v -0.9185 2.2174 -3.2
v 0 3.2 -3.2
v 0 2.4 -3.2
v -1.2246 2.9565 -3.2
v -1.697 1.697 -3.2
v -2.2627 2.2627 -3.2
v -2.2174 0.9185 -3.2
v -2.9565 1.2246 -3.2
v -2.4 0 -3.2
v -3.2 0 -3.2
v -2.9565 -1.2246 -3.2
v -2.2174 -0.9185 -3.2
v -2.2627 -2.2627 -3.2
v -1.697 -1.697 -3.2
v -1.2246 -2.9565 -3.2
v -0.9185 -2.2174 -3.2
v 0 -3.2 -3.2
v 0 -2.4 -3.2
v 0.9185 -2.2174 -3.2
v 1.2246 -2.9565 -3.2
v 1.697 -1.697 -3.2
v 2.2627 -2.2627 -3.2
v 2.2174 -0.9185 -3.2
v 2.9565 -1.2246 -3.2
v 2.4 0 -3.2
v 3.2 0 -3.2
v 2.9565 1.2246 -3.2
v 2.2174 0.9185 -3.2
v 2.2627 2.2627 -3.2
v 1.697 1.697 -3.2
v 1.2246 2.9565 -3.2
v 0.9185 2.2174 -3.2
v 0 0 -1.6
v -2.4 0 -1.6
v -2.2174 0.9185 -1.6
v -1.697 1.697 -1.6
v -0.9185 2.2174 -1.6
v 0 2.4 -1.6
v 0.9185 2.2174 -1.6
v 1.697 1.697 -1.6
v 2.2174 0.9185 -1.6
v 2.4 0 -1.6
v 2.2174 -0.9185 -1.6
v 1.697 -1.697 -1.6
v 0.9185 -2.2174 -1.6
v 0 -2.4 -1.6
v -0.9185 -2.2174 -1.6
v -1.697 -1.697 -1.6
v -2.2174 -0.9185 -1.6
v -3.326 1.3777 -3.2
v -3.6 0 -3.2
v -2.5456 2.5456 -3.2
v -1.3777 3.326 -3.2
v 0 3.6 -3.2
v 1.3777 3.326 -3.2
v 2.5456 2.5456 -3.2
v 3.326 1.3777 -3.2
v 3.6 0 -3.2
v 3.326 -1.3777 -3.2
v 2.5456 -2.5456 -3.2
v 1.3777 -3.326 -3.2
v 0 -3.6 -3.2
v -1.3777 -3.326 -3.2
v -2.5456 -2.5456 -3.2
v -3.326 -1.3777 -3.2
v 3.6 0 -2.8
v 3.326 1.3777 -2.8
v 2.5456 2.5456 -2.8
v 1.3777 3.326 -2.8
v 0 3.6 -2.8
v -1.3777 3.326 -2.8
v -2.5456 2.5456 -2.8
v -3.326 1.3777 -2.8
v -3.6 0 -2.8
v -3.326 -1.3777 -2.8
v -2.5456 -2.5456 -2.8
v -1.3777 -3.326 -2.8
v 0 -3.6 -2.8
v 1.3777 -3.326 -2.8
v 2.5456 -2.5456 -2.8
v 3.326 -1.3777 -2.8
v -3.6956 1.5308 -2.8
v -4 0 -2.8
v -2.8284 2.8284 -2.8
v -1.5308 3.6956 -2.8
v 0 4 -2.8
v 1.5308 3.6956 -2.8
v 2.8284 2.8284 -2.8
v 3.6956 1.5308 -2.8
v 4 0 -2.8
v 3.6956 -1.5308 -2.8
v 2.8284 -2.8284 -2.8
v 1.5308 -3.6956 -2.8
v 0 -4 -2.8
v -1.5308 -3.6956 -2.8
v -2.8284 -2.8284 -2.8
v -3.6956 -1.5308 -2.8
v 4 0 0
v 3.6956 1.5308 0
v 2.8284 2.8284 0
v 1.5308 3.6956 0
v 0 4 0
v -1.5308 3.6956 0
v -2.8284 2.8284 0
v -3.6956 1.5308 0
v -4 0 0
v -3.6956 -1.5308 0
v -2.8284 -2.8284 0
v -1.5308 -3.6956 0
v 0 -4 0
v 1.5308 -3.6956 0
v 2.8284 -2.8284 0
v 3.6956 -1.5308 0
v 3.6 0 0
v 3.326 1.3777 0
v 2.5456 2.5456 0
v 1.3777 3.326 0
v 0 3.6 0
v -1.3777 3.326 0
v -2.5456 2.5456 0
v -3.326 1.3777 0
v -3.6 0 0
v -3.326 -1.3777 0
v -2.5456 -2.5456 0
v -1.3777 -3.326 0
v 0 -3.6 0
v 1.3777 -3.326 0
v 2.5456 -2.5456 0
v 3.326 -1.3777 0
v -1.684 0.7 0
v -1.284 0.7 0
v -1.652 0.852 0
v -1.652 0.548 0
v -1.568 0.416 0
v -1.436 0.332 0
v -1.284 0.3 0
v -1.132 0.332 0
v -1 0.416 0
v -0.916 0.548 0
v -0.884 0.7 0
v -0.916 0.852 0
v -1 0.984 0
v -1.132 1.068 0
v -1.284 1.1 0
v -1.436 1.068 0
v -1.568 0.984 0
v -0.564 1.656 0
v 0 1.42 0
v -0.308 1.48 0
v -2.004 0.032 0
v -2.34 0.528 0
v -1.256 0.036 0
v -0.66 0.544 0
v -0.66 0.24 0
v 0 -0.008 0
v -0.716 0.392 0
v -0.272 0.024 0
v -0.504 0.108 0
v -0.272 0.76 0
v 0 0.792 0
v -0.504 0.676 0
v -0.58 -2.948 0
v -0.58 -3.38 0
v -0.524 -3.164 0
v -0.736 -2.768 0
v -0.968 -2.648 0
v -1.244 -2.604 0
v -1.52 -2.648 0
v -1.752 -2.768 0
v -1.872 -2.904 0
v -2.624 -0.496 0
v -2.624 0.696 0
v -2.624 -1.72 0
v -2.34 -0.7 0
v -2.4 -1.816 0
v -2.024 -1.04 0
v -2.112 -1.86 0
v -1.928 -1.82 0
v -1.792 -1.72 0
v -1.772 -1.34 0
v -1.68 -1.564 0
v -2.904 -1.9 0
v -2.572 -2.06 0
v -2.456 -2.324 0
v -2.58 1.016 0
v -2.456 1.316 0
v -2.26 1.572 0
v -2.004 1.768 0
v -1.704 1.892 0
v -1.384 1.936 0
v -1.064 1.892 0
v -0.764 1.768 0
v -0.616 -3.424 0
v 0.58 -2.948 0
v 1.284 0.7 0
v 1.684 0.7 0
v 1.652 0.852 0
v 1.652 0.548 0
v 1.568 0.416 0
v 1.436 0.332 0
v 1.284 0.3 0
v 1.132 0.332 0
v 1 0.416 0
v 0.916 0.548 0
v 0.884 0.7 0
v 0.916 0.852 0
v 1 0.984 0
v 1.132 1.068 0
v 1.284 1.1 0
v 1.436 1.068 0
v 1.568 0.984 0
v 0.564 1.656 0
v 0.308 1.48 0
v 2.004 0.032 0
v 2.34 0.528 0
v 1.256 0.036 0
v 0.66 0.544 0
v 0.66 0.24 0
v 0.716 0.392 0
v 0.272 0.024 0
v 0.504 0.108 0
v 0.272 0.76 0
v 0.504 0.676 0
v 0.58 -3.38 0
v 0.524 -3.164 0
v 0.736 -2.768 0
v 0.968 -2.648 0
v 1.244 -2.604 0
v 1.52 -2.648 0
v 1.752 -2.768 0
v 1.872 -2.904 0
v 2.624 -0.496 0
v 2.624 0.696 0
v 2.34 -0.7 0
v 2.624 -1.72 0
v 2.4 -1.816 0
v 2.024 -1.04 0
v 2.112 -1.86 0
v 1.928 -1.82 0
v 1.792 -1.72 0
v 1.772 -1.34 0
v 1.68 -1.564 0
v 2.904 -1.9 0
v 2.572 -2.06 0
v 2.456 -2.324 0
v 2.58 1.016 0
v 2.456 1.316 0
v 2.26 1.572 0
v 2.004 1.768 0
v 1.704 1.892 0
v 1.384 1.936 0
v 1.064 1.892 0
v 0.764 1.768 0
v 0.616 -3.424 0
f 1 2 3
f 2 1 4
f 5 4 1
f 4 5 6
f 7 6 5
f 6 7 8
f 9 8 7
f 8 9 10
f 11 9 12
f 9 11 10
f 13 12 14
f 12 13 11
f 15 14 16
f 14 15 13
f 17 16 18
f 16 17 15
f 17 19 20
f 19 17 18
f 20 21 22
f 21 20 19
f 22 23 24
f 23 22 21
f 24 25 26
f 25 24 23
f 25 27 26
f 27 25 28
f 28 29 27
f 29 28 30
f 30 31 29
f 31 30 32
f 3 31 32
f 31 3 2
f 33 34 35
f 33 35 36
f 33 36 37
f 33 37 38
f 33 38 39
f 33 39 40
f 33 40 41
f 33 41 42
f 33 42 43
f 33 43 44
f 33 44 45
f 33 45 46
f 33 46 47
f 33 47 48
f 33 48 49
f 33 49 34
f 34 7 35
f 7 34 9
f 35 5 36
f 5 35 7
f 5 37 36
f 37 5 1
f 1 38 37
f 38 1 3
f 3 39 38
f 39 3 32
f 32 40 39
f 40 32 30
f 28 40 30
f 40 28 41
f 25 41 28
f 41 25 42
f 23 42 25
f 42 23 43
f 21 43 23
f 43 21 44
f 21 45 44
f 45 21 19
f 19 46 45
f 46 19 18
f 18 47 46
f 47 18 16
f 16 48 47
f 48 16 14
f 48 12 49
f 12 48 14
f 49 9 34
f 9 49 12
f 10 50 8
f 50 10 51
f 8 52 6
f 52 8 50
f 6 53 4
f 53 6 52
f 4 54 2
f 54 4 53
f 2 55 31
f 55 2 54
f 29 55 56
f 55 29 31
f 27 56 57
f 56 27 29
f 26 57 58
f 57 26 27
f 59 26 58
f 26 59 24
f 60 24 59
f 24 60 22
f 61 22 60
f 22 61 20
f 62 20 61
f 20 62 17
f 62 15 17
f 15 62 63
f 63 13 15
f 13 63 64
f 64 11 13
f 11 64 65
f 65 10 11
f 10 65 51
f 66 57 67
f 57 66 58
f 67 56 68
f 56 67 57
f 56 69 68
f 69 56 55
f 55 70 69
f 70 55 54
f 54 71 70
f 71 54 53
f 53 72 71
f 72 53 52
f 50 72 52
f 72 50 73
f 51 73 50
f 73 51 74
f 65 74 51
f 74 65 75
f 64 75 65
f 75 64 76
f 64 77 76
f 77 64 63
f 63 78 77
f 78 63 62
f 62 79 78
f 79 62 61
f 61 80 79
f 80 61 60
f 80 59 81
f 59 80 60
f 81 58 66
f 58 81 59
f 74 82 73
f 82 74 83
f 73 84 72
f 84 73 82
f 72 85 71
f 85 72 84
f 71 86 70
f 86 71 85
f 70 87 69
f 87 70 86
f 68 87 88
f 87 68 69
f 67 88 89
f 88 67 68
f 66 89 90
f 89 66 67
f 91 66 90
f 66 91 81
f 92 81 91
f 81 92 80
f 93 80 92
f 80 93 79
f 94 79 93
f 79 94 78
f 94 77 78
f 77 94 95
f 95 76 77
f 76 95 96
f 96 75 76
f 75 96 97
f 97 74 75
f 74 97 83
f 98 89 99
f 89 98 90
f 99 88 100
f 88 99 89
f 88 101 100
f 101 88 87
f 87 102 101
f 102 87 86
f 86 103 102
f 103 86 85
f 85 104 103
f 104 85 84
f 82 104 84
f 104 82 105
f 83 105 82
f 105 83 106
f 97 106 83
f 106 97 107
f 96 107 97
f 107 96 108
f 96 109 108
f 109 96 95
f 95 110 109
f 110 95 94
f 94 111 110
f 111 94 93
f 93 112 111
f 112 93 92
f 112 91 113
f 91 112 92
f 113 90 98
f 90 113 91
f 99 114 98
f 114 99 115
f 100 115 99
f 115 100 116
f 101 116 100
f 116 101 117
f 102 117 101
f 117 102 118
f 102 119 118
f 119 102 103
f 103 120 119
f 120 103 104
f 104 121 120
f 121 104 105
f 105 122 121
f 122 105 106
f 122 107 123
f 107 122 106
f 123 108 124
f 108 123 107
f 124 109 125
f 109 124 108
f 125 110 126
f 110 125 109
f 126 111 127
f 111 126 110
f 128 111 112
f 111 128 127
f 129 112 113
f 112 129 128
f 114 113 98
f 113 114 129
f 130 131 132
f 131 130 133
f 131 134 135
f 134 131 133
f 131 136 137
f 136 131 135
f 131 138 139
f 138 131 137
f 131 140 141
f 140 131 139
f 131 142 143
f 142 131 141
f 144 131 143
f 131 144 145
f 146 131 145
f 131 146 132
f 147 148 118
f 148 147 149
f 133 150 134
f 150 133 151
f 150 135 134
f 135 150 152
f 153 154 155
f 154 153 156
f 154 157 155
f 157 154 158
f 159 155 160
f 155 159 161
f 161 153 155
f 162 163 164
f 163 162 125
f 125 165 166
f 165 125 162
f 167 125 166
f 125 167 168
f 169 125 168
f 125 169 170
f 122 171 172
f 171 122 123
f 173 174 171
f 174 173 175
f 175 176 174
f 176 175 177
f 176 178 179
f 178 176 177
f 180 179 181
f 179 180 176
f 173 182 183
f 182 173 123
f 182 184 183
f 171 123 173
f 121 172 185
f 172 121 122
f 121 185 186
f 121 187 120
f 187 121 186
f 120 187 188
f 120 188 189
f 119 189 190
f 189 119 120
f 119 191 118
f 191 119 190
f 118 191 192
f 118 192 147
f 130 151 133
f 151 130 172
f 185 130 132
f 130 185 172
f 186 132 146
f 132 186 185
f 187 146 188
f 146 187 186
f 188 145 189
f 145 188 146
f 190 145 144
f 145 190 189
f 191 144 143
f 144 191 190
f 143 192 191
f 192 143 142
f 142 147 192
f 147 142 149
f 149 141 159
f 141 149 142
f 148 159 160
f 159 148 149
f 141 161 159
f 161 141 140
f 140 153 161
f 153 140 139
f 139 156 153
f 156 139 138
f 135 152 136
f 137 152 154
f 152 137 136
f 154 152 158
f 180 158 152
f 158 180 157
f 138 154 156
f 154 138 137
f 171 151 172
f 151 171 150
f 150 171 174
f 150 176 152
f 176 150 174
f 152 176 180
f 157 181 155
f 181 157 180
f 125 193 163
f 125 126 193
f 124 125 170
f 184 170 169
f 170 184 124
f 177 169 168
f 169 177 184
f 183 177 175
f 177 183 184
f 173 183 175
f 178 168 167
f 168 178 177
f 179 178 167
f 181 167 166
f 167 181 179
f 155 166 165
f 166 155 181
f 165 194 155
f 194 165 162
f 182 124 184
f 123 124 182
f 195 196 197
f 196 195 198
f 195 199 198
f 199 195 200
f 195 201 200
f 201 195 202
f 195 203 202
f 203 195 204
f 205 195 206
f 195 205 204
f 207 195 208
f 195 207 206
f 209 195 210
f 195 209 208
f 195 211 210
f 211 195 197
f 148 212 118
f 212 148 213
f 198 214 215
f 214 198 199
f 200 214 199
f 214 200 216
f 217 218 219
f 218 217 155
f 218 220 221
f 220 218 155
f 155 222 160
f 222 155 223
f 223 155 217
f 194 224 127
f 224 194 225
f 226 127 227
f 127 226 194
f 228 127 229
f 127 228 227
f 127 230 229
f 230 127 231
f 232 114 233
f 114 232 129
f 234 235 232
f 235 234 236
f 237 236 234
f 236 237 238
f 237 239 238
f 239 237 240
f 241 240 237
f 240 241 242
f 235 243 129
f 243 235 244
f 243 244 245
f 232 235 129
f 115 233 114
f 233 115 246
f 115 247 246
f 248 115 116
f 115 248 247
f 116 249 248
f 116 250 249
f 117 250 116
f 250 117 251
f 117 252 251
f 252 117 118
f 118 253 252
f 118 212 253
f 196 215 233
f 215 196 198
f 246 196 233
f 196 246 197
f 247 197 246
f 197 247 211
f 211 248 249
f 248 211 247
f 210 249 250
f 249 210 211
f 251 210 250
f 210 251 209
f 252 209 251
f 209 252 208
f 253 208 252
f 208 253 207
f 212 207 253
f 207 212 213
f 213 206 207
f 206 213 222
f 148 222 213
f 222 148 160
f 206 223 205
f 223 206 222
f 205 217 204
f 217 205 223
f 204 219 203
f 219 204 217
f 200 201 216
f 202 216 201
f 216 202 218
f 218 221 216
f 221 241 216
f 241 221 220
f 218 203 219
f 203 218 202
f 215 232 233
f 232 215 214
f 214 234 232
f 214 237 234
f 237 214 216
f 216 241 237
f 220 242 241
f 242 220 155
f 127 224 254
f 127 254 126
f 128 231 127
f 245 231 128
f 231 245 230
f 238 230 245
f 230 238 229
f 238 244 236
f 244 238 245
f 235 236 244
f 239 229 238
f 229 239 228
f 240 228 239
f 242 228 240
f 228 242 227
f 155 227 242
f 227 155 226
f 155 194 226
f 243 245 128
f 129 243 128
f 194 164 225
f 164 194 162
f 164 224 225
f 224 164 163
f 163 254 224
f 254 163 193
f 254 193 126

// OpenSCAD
use <../lib.scad>
use <../p/1-16chrd.scad>
use <../p/2-4ering.scad>
use <../p/3-16ering.scad>
use <s/98138s01.scad>
$fa=1; $fs=0.2;
function ldraw_lib__98138p1l(realsolid=false) = [
// 0 Tile  1 x  1 Round with Black Penguin with Yellow Beak and Feet and Bright Pink Cheeks Pattern
// 0 Name: 98138p1l.dat
// 0 Author: Gerald Lasser [GeraldLasser]
// 0 !LDRAW_ORG Part UPDATE 2022-01
// 0 !LICENSE Licensed under CC BY 2.0 and CC BY 4.0 : see CAreadme.txt
// 
// 0 BFC CERTIFY CCW
  [0,"BFC","CERTIFY"],
  [0,"BFC","CCW"],
// 
// 0 !KEYWORDS Bricklink 98138pb162, Dots, Mega Pack, Set 41913
// 
// 0 !HISTORY 2022-01-14 [PTadmin] Official Update 2022-01
// 
// 
// 1 16 0 0 0 1 0 0 0 1 0 0 0 1 s\98138s01.dat
  [1,16,0,0,0,1,0,0,0,1,0,0,0,1, ldraw_lib__s__98138s01(realsolid)],
// 1 0 0 0 0 9 0 0 0 1 0 0 0 9 2-4ering.dat
  [1,0,0,0,0,9,0,0,0,1,0,0,0,9, ldraw_lib__2_4ering(realsolid)],
// 1 16 0 0 0 0 0 -9 0 1 0 -9 0 0 3-16ering.dat
  [1,16,0,0,0,0,0,-9,0,1,0,-9,0,0, ldraw_lib__3_16ering(realsolid)],
// 1 16 0 0 0 0 0 9 0 1 0 -9 0 0 3-16ering.dat
  [1,16,0,0,0,0,0,9,0,1,0,-9,0,0, ldraw_lib__3_16ering(realsolid)],
// 1 0 0 0 0 -9 0 0 0 1 0 0 0 -9 1-16chrd.dat
  [1,0,0,0,0,-9,0,0,0,1,0,0,0,-9, ldraw_lib__1_16chrd(realsolid)],
// 1 0 0 0 0 9 0 0 0 1 0 0 0 -9 1-16chrd.dat
  [1,0,0,0,0,9,0,0,0,1,0,0,0,-9, ldraw_lib__1_16chrd(realsolid)],
// 
// 4 0 -3.21 0 1.75 -4.13 0 2.13 -4.21 0 1.75 -4.13 0 1.37
  [4,0,-3.21,0,1.75,-4.13,0,2.13,-4.21,0,1.75,-4.13,0,1.37],
// 4 0 -3.21 0 1.75 -4.13 0 1.37 -3.92 0 1.04 -3.59 0 .83
  [4,0,-3.21,0,1.75,-4.13,0,1.37,-3.92,0,1.04,-3.59,0,.83],
// 4 0 -3.21 0 1.75 -3.59 0 .83 -3.21 0 .75 -2.83 0 .83
  [4,0,-3.21,0,1.75,-3.59,0,.83,-3.21,0,.75,-2.83,0,.83],
// 4 0 -3.21 0 1.75 -2.83 0 .83 -2.5 0 1.04 -2.29 0 1.37
  [4,0,-3.21,0,1.75,-2.83,0,.83,-2.5,0,1.04,-2.29,0,1.37],
// 4 0 -3.21 0 1.75 -2.29 0 1.37 -2.21 0 1.75 -2.29 0 2.13
  [4,0,-3.21,0,1.75,-2.29,0,1.37,-2.21,0,1.75,-2.29,0,2.13],
// 4 0 -3.21 0 1.75 -2.29 0 2.13 -2.5 0 2.46 -2.83 0 2.67
  [4,0,-3.21,0,1.75,-2.29,0,2.13,-2.5,0,2.46,-2.83,0,2.67],
// 4 0 -3.21 0 1.75 -2.83 0 2.67 -3.21 0 2.75 -3.59 0 2.67
  [4,0,-3.21,0,1.75,-2.83,0,2.67,-3.21,0,2.75,-3.59,0,2.67],
// 4 0 -3.21 0 1.75 -3.59 0 2.67 -3.92 0 2.46 -4.13 0 2.13
  [4,0,-3.21,0,1.75,-3.59,0,2.67,-3.92,0,2.46,-4.13,0,2.13],
// 4 0 0 0 9 -1.41 0 4.14 -.77 0 3.7 0 0 3.55
  [4,0,0,0,9,-1.41,0,4.14,-.77,0,3.7,0,0,3.55],
// 4 29 -4.13 0 1.37 -5.85 0 1.32 -5.01 0 .08 -3.92 0 1.04
  [4,29,-4.13,0,1.37,-5.85,0,1.32,-5.01,0,.08,-3.92,0,1.04],
// 4 29 -3.59 0 .83 -3.92 0 1.04 -5.01 0 .08 -3.14 0 .09
  [4,29,-3.59,0,.83,-3.92,0,1.04,-5.01,0,.08,-3.14,0,.09],
// 4 14 0 0 -.02 -1.65 0 1.36 -1.79 0 .98 -1.65 0 .6
  [4,14,0,0,-.02,-1.65,0,1.36,-1.79,0,.98,-1.65,0,.6],
// 4 14 0 0 -.02 -1.65 0 .6 -1.26 0 .27 -.68 0 .06
  [4,14,0,0,-.02,-1.65,0,.6,-1.26,0,.27,-.68,0,.06],
// 4 14 0 0 -.02 0 0 1.98 -.68 0 1.9 -1.26 0 1.69
  [4,14,0,0,-.02,0,0,1.98,-.68,0,1.9,-1.26,0,1.69],
// 3 14 -1.26 0 1.69 -1.65 0 1.36 0 0 -.02
  [3,14,-1.26,0,1.69,-1.65,0,1.36,0,0,-.02],
// 4 14 -3.4443 0 -8.3151 -1.45 0 -8.45 -1.31 0 -7.91 -1.45 0 -7.37
  [4,14,-3.4443,0,-8.3151,-1.45,0,-8.45,-1.31,0,-7.91,-1.45,0,-7.37],
// 4 14 -3.4443 0 -8.3151 -1.45 0 -7.37 -1.84 0 -6.92 -2.42 0 -6.62
  [4,14,-3.4443,0,-8.3151,-1.45,0,-7.37,-1.84,0,-6.92,-2.42,0,-6.62],
// 4 14 -3.4443 0 -8.3151 -2.42 0 -6.62 -3.11 0 -6.51 -3.8 0 -6.62
  [4,14,-3.4443,0,-8.3151,-2.42,0,-6.62,-3.11,0,-6.51,-3.8,0,-6.62],
// 4 14 -3.4443 0 -8.3151 -3.8 0 -6.62 -4.38 0 -6.92 -4.68 0 -7.26
  [4,14,-3.4443,0,-8.3151,-3.8,0,-6.62,-4.38,0,-6.92,-4.68,0,-7.26],
// 4 0 -6.56 0 -1.24 -6.56 0 1.74 -9 0 0 -8.3151 0 -3.4443
  [4,0,-6.56,0,-1.24,-6.56,0,1.74,-9,0,0,-8.3151,0,-3.4443],
// 4 0 -5.85 0 -1.75 -6.56 0 -1.24 -6.56 0 -4.3 -6 0 -4.54
  [4,0,-5.85,0,-1.75,-6.56,0,-1.24,-6.56,0,-4.3,-6,0,-4.54],
// 4 0 -5.85 0 -1.75 -6 0 -4.54 -5.28 0 -4.65 -5.06 0 -2.6
  [4,0,-5.85,0,-1.75,-6,0,-4.54,-5.28,0,-4.65,-5.06,0,-2.6],
// 4 0 -5.06 0 -2.6 -5.28 0 -4.65 -4.82 0 -4.55 -4.48 0 -4.3
  [4,0,-5.06,0,-2.6,-5.28,0,-4.65,-4.82,0,-4.55,-4.48,0,-4.3],
// 4 0 -4.43 0 -3.35 -5.06 0 -2.6 -4.48 0 -4.3 -4.2 0 -3.91
  [4,0,-4.43,0,-3.35,-5.06,0,-2.6,-4.48,0,-4.3,-4.2,0,-3.91],
// 4 0 -6.56 0 -4.3 -8.3151 0 -3.4443 -7.26 0 -4.75 -6.43 0 -5.15
  [4,0,-6.56,0,-4.3,-8.3151,0,-3.4443,-7.26,0,-4.75,-6.43,0,-5.15],
// 3 0 -7.26 0 -4.75 -6.14 0 -5.81 -6.43 0 -5.15
  [3,0,-7.26,0,-4.75,-6.14,0,-5.81,-6.43,0,-5.15],
// 3 0 -6.56 0 -1.24 -8.3151 0 -3.4443 -6.56 0 -4.3
  [3,0,-6.56,0,-1.24,-8.3151,0,-3.4443,-6.56,0,-4.3],
// 4 0 -8.3151 0 3.4443 -9 0 0 -6.56 0 1.74 -6.45 0 2.54
  [4,0,-8.3151,0,3.4443,-9,0,0,-6.56,0,1.74,-6.45,0,2.54],
// 3 0 -8.3151 0 3.4443 -6.45 0 2.54 -6.14 0 3.29
  [3,0,-8.3151,0,3.4443,-6.45,0,2.54,-6.14,0,3.29],
// 4 0 -8.3151 0 3.4443 -6.14 0 3.29 -5.65 0 3.93 -6.3639 0 6.3639
  [4,0,-8.3151,0,3.4443,-6.14,0,3.29,-5.65,0,3.93,-6.3639,0,6.3639],
// 3 0 -6.3639 0 6.3639 -5.65 0 3.93 -5.01 0 4.42
  [3,0,-6.3639,0,6.3639,-5.65,0,3.93,-5.01,0,4.42],
// 3 0 -6.3639 0 6.3639 -5.01 0 4.42 -4.26 0 4.73
  [3,0,-6.3639,0,6.3639,-5.01,0,4.42,-4.26,0,4.73],
// 4 0 -6.3639 0 6.3639 -4.26 0 4.73 -3.46 0 4.84 -3.4443 0 8.3151
  [4,0,-6.3639,0,6.3639,-4.26,0,4.73,-3.46,0,4.84,-3.4443,0,8.3151],
// 4 0 -3.4443 0 8.3151 -3.46 0 4.84 -2.66 0 4.73 0 0 9
  [4,0,-3.4443,0,8.3151,-3.46,0,4.84,-2.66,0,4.73,0,0,9],
// 3 0 0 0 9 -2.66 0 4.73 -1.91 0 4.42
  [3,0,0,0,9,-2.66,0,4.73,-1.91,0,4.42],
// 3 0 0 0 9 -1.91 0 4.42 -1.41 0 4.14
  [3,0,0,0,9,-1.91,0,4.42,-1.41,0,4.14],
// 4 16 -6.56 0 1.74 -5.85 0 1.32 -4.13 0 1.37 -4.21 0 1.75
  [4,16,-6.56,0,1.74,-5.85,0,1.32,-4.13,0,1.37,-4.21,0,1.75],
// 4 16 -6.45 0 2.54 -6.56 0 1.74 -4.21 0 1.75 -4.13 0 2.13
  [4,16,-6.45,0,2.54,-6.56,0,1.74,-4.21,0,1.75,-4.13,0,2.13],
// 4 16 -6.45 0 2.54 -4.13 0 2.13 -3.92 0 2.46 -6.14 0 3.29
  [4,16,-6.45,0,2.54,-4.13,0,2.13,-3.92,0,2.46,-6.14,0,3.29],
// 4 16 -5.65 0 3.93 -6.14 0 3.29 -3.92 0 2.46 -5.01 0 4.42
  [4,16,-5.65,0,3.93,-6.14,0,3.29,-3.92,0,2.46,-5.01,0,4.42],
// 4 16 -5.01 0 4.42 -3.92 0 2.46 -3.59 0 2.67 -4.26 0 4.73
  [4,16,-5.01,0,4.42,-3.92,0,2.46,-3.59,0,2.67,-4.26,0,4.73],
// 4 16 -4.26 0 4.73 -3.59 0 2.67 -3.21 0 2.75 -3.46 0 4.84
  [4,16,-4.26,0,4.73,-3.59,0,2.67,-3.21,0,2.75,-3.46,0,4.84],
// 4 16 -2.66 0 4.73 -3.46 0 4.84 -3.21 0 2.75 -2.83 0 2.67
  [4,16,-2.66,0,4.73,-3.46,0,4.84,-3.21,0,2.75,-2.83,0,2.67],
// 4 16 -1.91 0 4.42 -2.66 0 4.73 -2.83 0 2.67 -2.5 0 2.46
  [4,16,-1.91,0,4.42,-2.66,0,4.73,-2.83,0,2.67,-2.5,0,2.46],
// 4 16 -1.41 0 4.14 -1.91 0 4.42 -2.5 0 2.46 -.77 0 3.7
  [4,16,-1.41,0,4.14,-1.91,0,4.42,-2.5,0,2.46,-.77,0,3.7],
// 4 16 -.77 0 3.7 -2.5 0 2.46 -2.29 0 2.13 -.68 0 1.9
  [4,16,-.77,0,3.7,-2.5,0,2.46,-2.29,0,2.13,-.68,0,1.9],
// 4 16 0 0 3.55 -.77 0 3.7 -.68 0 1.9 0 0 1.98
  [4,16,0,0,3.55,-.77,0,3.7,-.68,0,1.9,0,0,1.98],
// 4 16 -2.29 0 2.13 -2.21 0 1.75 -1.26 0 1.69 -.68 0 1.9
  [4,16,-2.29,0,2.13,-2.21,0,1.75,-1.26,0,1.69,-.68,0,1.9],
// 4 16 -2.21 0 1.75 -2.29 0 1.37 -1.65 0 1.36 -1.26 0 1.69
  [4,16,-2.21,0,1.75,-2.29,0,1.37,-1.65,0,1.36,-1.26,0,1.69],
// 4 16 -2.29 0 1.37 -2.5 0 1.04 -1.79 0 .98 -1.65 0 1.36
  [4,16,-2.29,0,1.37,-2.5,0,1.04,-1.79,0,.98,-1.65,0,1.36],
// 3 16 -3.59 0 .83 -3.14 0 .09 -3.21 0 .75
  [3,16,-3.59,0,.83,-3.14,0,.09,-3.21,0,.75],
// 4 16 -2.83 0 .83 -3.21 0 .75 -3.14 0 .09 -1.65 0 .6
  [4,16,-2.83,0,.83,-3.21,0,.75,-3.14,0,.09,-1.65,0,.6],
// 3 16 -1.65 0 .6 -3.14 0 .09 -1.26 0 .27
  [3,16,-1.65,0,.6,-3.14,0,.09,-1.26,0,.27],
// 4 16 -.68 0 .06 -1.26 0 .27 -3.14 0 .09 -4.43 0 -3.35
  [4,16,-.68,0,.06,-1.26,0,.27,-3.14,0,.09,-4.43,0,-3.35],
// 4 16 -2.5 0 1.04 -2.83 0 .83 -1.65 0 .6 -1.79 0 .98
  [4,16,-2.5,0,1.04,-2.83,0,.83,-1.65,0,.6,-1.79,0,.98],
// 4 16 -6.56 0 -1.24 -5.01 0 .08 -5.85 0 1.32 -6.56 0 1.74
  [4,16,-6.56,0,-1.24,-5.01,0,.08,-5.85,0,1.32,-6.56,0,1.74],
// 3 16 -5.01 0 .08 -6.56 0 -1.24 -5.85 0 -1.75
  [3,16,-5.01,0,.08,-6.56,0,-1.24,-5.85,0,-1.75],
// 4 16 -5.01 0 .08 -5.85 0 -1.75 -5.06 0 -2.6 -3.14 0 .09
  [4,16,-5.01,0,.08,-5.85,0,-1.75,-5.06,0,-2.6,-3.14,0,.09],
// 3 16 -3.14 0 .09 -5.06 0 -2.6 -4.43 0 -3.35
  [3,16,-3.14,0,.09,-5.06,0,-2.6,-4.43,0,-3.35],
// 4 16 0 0 -.02 -.68 0 .06 -4.43 0 -3.35 -4.2 0 -3.91
  [4,16,0,0,-.02,-.68,0,.06,-4.43,0,-3.35,-4.2,0,-3.91],
// 3 14 -3.4443 0 -8.3151 -1.54 0 -8.56 -1.45 0 -8.45
  [3,14,-3.4443,0,-8.3151,-1.54,0,-8.56,-1.45,0,-8.45],
// 3 16 -3.4443 0 -8.3151 0 0 -9 -1.54 0 -8.56
  [3,16,-3.4443,0,-8.3151,0,0,-9,-1.54,0,-8.56],
// 3 16 -6.3639 0 -6.3639 -3.4443 0 -8.3151 -4.68 0 -7.26
  [3,16,-6.3639,0,-6.3639,-3.4443,0,-8.3151,-4.68,0,-7.26],
// 4 16 -6.14 0 -5.81 -6.3639 0 -6.3639 -4.68 0 -7.26 -4.38 0 -6.92
  [4,16,-6.14,0,-5.81,-6.3639,0,-6.3639,-4.68,0,-7.26,-4.38,0,-6.92],
// 4 16 -6.14 0 -5.81 -4.38 0 -6.92 -3.8 0 -6.62 -5.28 0 -4.65
  [4,16,-6.14,0,-5.81,-4.38,0,-6.92,-3.8,0,-6.62,-5.28,0,-4.65],
// 4 16 -6.43 0 -5.15 -6.14 0 -5.81 -5.28 0 -4.65 -6 0 -4.54
  [4,16,-6.43,0,-5.15,-6.14,0,-5.81,-5.28,0,-4.65,-6,0,-4.54],
// 3 16 -6.56 0 -4.3 -6.43 0 -5.15 -6 0 -4.54
  [3,16,-6.56,0,-4.3,-6.43,0,-5.15,-6,0,-4.54],
// 4 16 -5.28 0 -4.65 -3.8 0 -6.62 -3.11 0 -6.51 -4.82 0 -4.55
  [4,16,-5.28,0,-4.65,-3.8,0,-6.62,-3.11,0,-6.51,-4.82,0,-4.55],
// 3 16 -4.48 0 -4.3 -4.82 0 -4.55 -3.11 0 -6.51
  [3,16,-4.48,0,-4.3,-4.82,0,-4.55,-3.11,0,-6.51],
// 4 16 -4.2 0 -3.91 -4.48 0 -4.3 -3.11 0 -6.51 -2.42 0 -6.62
  [4,16,-4.2,0,-3.91,-4.48,0,-4.3,-3.11,0,-6.51,-2.42,0,-6.62],
// 4 16 0 0 -.02 -4.2 0 -3.91 -2.42 0 -6.62 -1.84 0 -6.92
  [4,16,0,0,-.02,-4.2,0,-3.91,-2.42,0,-6.62,-1.84,0,-6.92],
// 4 16 0 0 -.02 -1.84 0 -6.92 -1.45 0 -7.37 1.45 0 -7.37
  [4,16,0,0,-.02,-1.84,0,-6.92,-1.45,0,-7.37,1.45,0,-7.37],
// 3 16 -7.26 0 -4.75 -6.3639 0 -6.3639 -6.14 0 -5.81
  [3,16,-7.26,0,-4.75,-6.3639,0,-6.3639,-6.14,0,-5.81],
// 3 16 -8.3151 0 -3.4443 -6.3639 0 -6.3639 -7.26 0 -4.75
  [3,16,-8.3151,0,-3.4443,-6.3639,0,-6.3639,-7.26,0,-4.75],
// 4 0 4.21 0 1.75 4.13 0 2.13 3.21 0 1.75 4.13 0 1.37
  [4,0,4.21,0,1.75,4.13,0,2.13,3.21,0,1.75,4.13,0,1.37],
// 4 0 3.92 0 1.04 4.13 0 1.37 3.21 0 1.75 3.59 0 .83
  [4,0,3.92,0,1.04,4.13,0,1.37,3.21,0,1.75,3.59,0,.83],
// 4 0 3.21 0 .75 3.59 0 .83 3.21 0 1.75 2.83 0 .83
  [4,0,3.21,0,.75,3.59,0,.83,3.21,0,1.75,2.83,0,.83],
// 4 0 2.5 0 1.04 2.83 0 .83 3.21 0 1.75 2.29 0 1.37
  [4,0,2.5,0,1.04,2.83,0,.83,3.21,0,1.75,2.29,0,1.37],
// 4 0 2.21 0 1.75 2.29 0 1.37 3.21 0 1.75 2.29 0 2.13
  [4,0,2.21,0,1.75,2.29,0,1.37,3.21,0,1.75,2.29,0,2.13],
// 4 0 2.5 0 2.46 2.29 0 2.13 3.21 0 1.75 2.83 0 2.67
  [4,0,2.5,0,2.46,2.29,0,2.13,3.21,0,1.75,2.83,0,2.67],
// 4 0 3.21 0 2.75 2.83 0 2.67 3.21 0 1.75 3.59 0 2.67
  [4,0,3.21,0,2.75,2.83,0,2.67,3.21,0,1.75,3.59,0,2.67],
// 4 0 3.92 0 2.46 3.59 0 2.67 3.21 0 1.75 4.13 0 2.13
  [4,0,3.92,0,2.46,3.59,0,2.67,3.21,0,1.75,4.13,0,2.13],
// 4 0 .77 0 3.7 1.41 0 4.14 0 0 9 0 0 3.55
  [4,0,.77,0,3.7,1.41,0,4.14,0,0,9,0,0,3.55],
// 4 29 5.01 0 .08 5.85 0 1.32 4.13 0 1.37 3.92 0 1.04
  [4,29,5.01,0,.08,5.85,0,1.32,4.13,0,1.37,3.92,0,1.04],
// 4 29 5.01 0 .08 3.92 0 1.04 3.59 0 .83 3.14 0 .09
  [4,29,5.01,0,.08,3.92,0,1.04,3.59,0,.83,3.14,0,.09],
// 4 14 1.79 0 .98 1.65 0 1.36 0 0 -.02 1.65 0 .6
  [4,14,1.79,0,.98,1.65,0,1.36,0,0,-.02,1.65,0,.6],
// 4 14 1.26 0 .27 1.65 0 .6 0 0 -.02 .68 0 .06
  [4,14,1.26,0,.27,1.65,0,.6,0,0,-.02,.68,0,.06],
// 4 14 .68 0 1.9 0 0 1.98 0 0 -.02 1.26 0 1.69
  [4,14,.68,0,1.9,0,0,1.98,0,0,-.02,1.26,0,1.69],
// 3 14 1.26 0 1.69 0 0 -.02 1.65 0 1.36
  [3,14,1.26,0,1.69,0,0,-.02,1.65,0,1.36],
// 4 14 1.31 0 -7.91 1.45 0 -8.45 3.4443 0 -8.3151 1.45 0 -7.37
  [4,14,1.31,0,-7.91,1.45,0,-8.45,3.4443,0,-8.3151,1.45,0,-7.37],
// 4 14 1.84 0 -6.92 1.45 0 -7.37 3.4443 0 -8.3151 2.42 0 -6.62
  [4,14,1.84,0,-6.92,1.45,0,-7.37,3.4443,0,-8.3151,2.42,0,-6.62],
// 4 14 3.11 0 -6.51 2.42 0 -6.62 3.4443 0 -8.3151 3.8 0 -6.62
  [4,14,3.11,0,-6.51,2.42,0,-6.62,3.4443,0,-8.3151,3.8,0,-6.62],
// 4 14 4.38 0 -6.92 3.8 0 -6.62 3.4443 0 -8.3151 4.68 0 -7.26
  [4,14,4.38,0,-6.92,3.8,0,-6.62,3.4443,0,-8.3151,4.68,0,-7.26],
// 4 0 9 0 0 6.56 0 1.74 6.56 0 -1.24 8.3151 0 -3.4443
  [4,0,9,0,0,6.56,0,1.74,6.56,0,-1.24,8.3151,0,-3.4443],
// 4 0 6.56 0 -4.3 6.56 0 -1.24 5.85 0 -1.75 6 0 -4.54
  [4,0,6.56,0,-4.3,6.56,0,-1.24,5.85,0,-1.75,6,0,-4.54],
// 4 0 5.28 0 -4.65 6 0 -4.54 5.85 0 -1.75 5.06 0 -2.6
  [4,0,5.28,0,-4.65,6,0,-4.54,5.85,0,-1.75,5.06,0,-2.6],
// 4 0 4.82 0 -4.55 5.28 0 -4.65 5.06 0 -2.6 4.48 0 -4.3
  [4,0,4.82,0,-4.55,5.28,0,-4.65,5.06,0,-2.6,4.48,0,-4.3],
// 4 0 4.48 0 -4.3 5.06 0 -2.6 4.43 0 -3.35 4.2 0 -3.91
  [4,0,4.48,0,-4.3,5.06,0,-2.6,4.43,0,-3.35,4.2,0,-3.91],
// 4 0 7.26 0 -4.75 8.3151 0 -3.4443 6.56 0 -4.3 6.43 0 -5.15
  [4,0,7.26,0,-4.75,8.3151,0,-3.4443,6.56,0,-4.3,6.43,0,-5.15],
// 3 0 7.26 0 -4.75 6.43 0 -5.15 6.14 0 -5.81
  [3,0,7.26,0,-4.75,6.43,0,-5.15,6.14,0,-5.81],
// 3 0 6.56 0 -1.24 6.56 0 -4.3 8.3151 0 -3.4443
  [3,0,6.56,0,-1.24,6.56,0,-4.3,8.3151,0,-3.4443],
// 4 0 6.56 0 1.74 9 0 0 8.3151 0 3.4443 6.45 0 2.54
  [4,0,6.56,0,1.74,9,0,0,8.3151,0,3.4443,6.45,0,2.54],
// 3 0 8.3151 0 3.4443 6.14 0 3.29 6.45 0 2.54
  [3,0,8.3151,0,3.4443,6.14,0,3.29,6.45,0,2.54],
// 4 0 5.65 0 3.93 6.14 0 3.29 8.3151 0 3.4443 6.3639 0 6.3639
  [4,0,5.65,0,3.93,6.14,0,3.29,8.3151,0,3.4443,6.3639,0,6.3639],
// 3 0 6.3639 0 6.3639 5.01 0 4.42 5.65 0 3.93
  [3,0,6.3639,0,6.3639,5.01,0,4.42,5.65,0,3.93],
// 3 0 6.3639 0 6.3639 4.26 0 4.73 5.01 0 4.42
  [3,0,6.3639,0,6.3639,4.26,0,4.73,5.01,0,4.42],
// 4 0 3.46 0 4.84 4.26 0 4.73 6.3639 0 6.3639 3.4443 0 8.3151
  [4,0,3.46,0,4.84,4.26,0,4.73,6.3639,0,6.3639,3.4443,0,8.3151],
// 4 0 2.66 0 4.73 3.46 0 4.84 3.4443 0 8.3151 0 0 9
  [4,0,2.66,0,4.73,3.46,0,4.84,3.4443,0,8.3151,0,0,9],
// 3 0 0 0 9 1.91 0 4.42 2.66 0 4.73
  [3,0,0,0,9,1.91,0,4.42,2.66,0,4.73],
// 3 0 0 0 9 1.41 0 4.14 1.91 0 4.42
  [3,0,0,0,9,1.41,0,4.14,1.91,0,4.42],
// 4 16 4.13 0 1.37 5.85 0 1.32 6.56 0 1.74 4.21 0 1.75
  [4,16,4.13,0,1.37,5.85,0,1.32,6.56,0,1.74,4.21,0,1.75],
// 4 16 4.21 0 1.75 6.56 0 1.74 6.45 0 2.54 4.13 0 2.13
  [4,16,4.21,0,1.75,6.56,0,1.74,6.45,0,2.54,4.13,0,2.13],
// 4 16 3.92 0 2.46 4.13 0 2.13 6.45 0 2.54 6.14 0 3.29
  [4,16,3.92,0,2.46,4.13,0,2.13,6.45,0,2.54,6.14,0,3.29],
// 4 16 3.92 0 2.46 6.14 0 3.29 5.65 0 3.93 5.01 0 4.42
  [4,16,3.92,0,2.46,6.14,0,3.29,5.65,0,3.93,5.01,0,4.42],
// 4 16 3.59 0 2.67 3.92 0 2.46 5.01 0 4.42 4.26 0 4.73
  [4,16,3.59,0,2.67,3.92,0,2.46,5.01,0,4.42,4.26,0,4.73],
// 4 16 3.21 0 2.75 3.59 0 2.67 4.26 0 4.73 3.46 0 4.84
  [4,16,3.21,0,2.75,3.59,0,2.67,4.26,0,4.73,3.46,0,4.84],
// 4 16 3.21 0 2.75 3.46 0 4.84 2.66 0 4.73 2.83 0 2.67
  [4,16,3.21,0,2.75,3.46,0,4.84,2.66,0,4.73,2.83,0,2.67],
// 4 16 2.83 0 2.67 2.66 0 4.73 1.91 0 4.42 2.5 0 2.46
  [4,16,2.83,0,2.67,2.66,0,4.73,1.91,0,4.42,2.5,0,2.46],
// 4 16 2.5 0 2.46 1.91 0 4.42 1.41 0 4.14 .77 0 3.7
  [4,16,2.5,0,2.46,1.91,0,4.42,1.41,0,4.14,.77,0,3.7],
// 4 16 2.29 0 2.13 2.5 0 2.46 .77 0 3.7 .68 0 1.9
  [4,16,2.29,0,2.13,2.5,0,2.46,.77,0,3.7,.68,0,1.9],
// 4 16 .68 0 1.9 .77 0 3.7 0 0 3.55 0 0 1.98
  [4,16,.68,0,1.9,.77,0,3.7,0,0,3.55,0,0,1.98],
// 4 16 1.26 0 1.69 2.21 0 1.75 2.29 0 2.13 .68 0 1.9
  [4,16,1.26,0,1.69,2.21,0,1.75,2.29,0,2.13,.68,0,1.9],
// 4 16 1.65 0 1.36 2.29 0 1.37 2.21 0 1.75 1.26 0 1.69
  [4,16,1.65,0,1.36,2.29,0,1.37,2.21,0,1.75,1.26,0,1.69],
// 4 16 1.79 0 .98 2.5 0 1.04 2.29 0 1.37 1.65 0 1.36
  [4,16,1.79,0,.98,2.5,0,1.04,2.29,0,1.37,1.65,0,1.36],
// 3 16 3.59 0 .83 3.21 0 .75 3.14 0 .09
  [3,16,3.59,0,.83,3.21,0,.75,3.14,0,.09],
// 4 16 3.14 0 .09 3.21 0 .75 2.83 0 .83 1.65 0 .6
  [4,16,3.14,0,.09,3.21,0,.75,2.83,0,.83,1.65,0,.6],
// 3 16 1.65 0 .6 1.26 0 .27 3.14 0 .09
  [3,16,1.65,0,.6,1.26,0,.27,3.14,0,.09],
// 4 16 3.14 0 .09 1.26 0 .27 .68 0 .06 4.43 0 -3.35
  [4,16,3.14,0,.09,1.26,0,.27,.68,0,.06,4.43,0,-3.35],
// 4 16 1.65 0 .6 2.83 0 .83 2.5 0 1.04 1.79 0 .98
  [4,16,1.65,0,.6,2.83,0,.83,2.5,0,1.04,1.79,0,.98],
// 4 16 5.85 0 1.32 5.01 0 .08 6.56 0 -1.24 6.56 0 1.74
  [4,16,5.85,0,1.32,5.01,0,.08,6.56,0,-1.24,6.56,0,1.74],
// 3 16 5.01 0 .08 5.85 0 -1.75 6.56 0 -1.24
  [3,16,5.01,0,.08,5.85,0,-1.75,6.56,0,-1.24],
// 4 16 5.06 0 -2.6 5.85 0 -1.75 5.01 0 .08 3.14 0 .09
  [4,16,5.06,0,-2.6,5.85,0,-1.75,5.01,0,.08,3.14,0,.09],
// 3 16 3.14 0 .09 4.43 0 -3.35 5.06 0 -2.6
  [3,16,3.14,0,.09,4.43,0,-3.35,5.06,0,-2.6],
// 4 16 4.43 0 -3.35 .68 0 .06 0 0 -.02 4.2 0 -3.91
  [4,16,4.43,0,-3.35,.68,0,.06,0,0,-.02,4.2,0,-3.91],
// 3 14 3.4443 0 -8.3151 1.45 0 -8.45 1.54 0 -8.56
  [3,14,3.4443,0,-8.3151,1.45,0,-8.45,1.54,0,-8.56],
// 3 16 3.4443 0 -8.3151 1.54 0 -8.56 0 0 -9
  [3,16,3.4443,0,-8.3151,1.54,0,-8.56,0,0,-9],
// 3 16 6.3639 0 -6.3639 4.68 0 -7.26 3.4443 0 -8.3151
  [3,16,6.3639,0,-6.3639,4.68,0,-7.26,3.4443,0,-8.3151],
// 4 16 4.68 0 -7.26 6.3639 0 -6.3639 6.14 0 -5.81 4.38 0 -6.92
  [4,16,4.68,0,-7.26,6.3639,0,-6.3639,6.14,0,-5.81,4.38,0,-6.92],
// 4 16 3.8 0 -6.62 4.38 0 -6.92 6.14 0 -5.81 5.28 0 -4.65
  [4,16,3.8,0,-6.62,4.38,0,-6.92,6.14,0,-5.81,5.28,0,-4.65],
// 4 16 5.28 0 -4.65 6.14 0 -5.81 6.43 0 -5.15 6 0 -4.54
  [4,16,5.28,0,-4.65,6.14,0,-5.81,6.43,0,-5.15,6,0,-4.54],
// 3 16 6.56 0 -4.3 6 0 -4.54 6.43 0 -5.15
  [3,16,6.56,0,-4.3,6,0,-4.54,6.43,0,-5.15],
// 4 16 3.11 0 -6.51 3.8 0 -6.62 5.28 0 -4.65 4.82 0 -4.55
  [4,16,3.11,0,-6.51,3.8,0,-6.62,5.28,0,-4.65,4.82,0,-4.55],
// 3 16 4.48 0 -4.3 3.11 0 -6.51 4.82 0 -4.55
  [3,16,4.48,0,-4.3,3.11,0,-6.51,4.82,0,-4.55],
// 4 16 3.11 0 -6.51 4.48 0 -4.3 4.2 0 -3.91 2.42 0 -6.62
  [4,16,3.11,0,-6.51,4.48,0,-4.3,4.2,0,-3.91,2.42,0,-6.62],
// 4 16 2.42 0 -6.62 4.2 0 -3.91 0 0 -.02 1.84 0 -6.92
  [4,16,2.42,0,-6.62,4.2,0,-3.91,0,0,-.02,1.84,0,-6.92],
// 3 16 0 0 -.02 1.45 0 -7.37 1.84 0 -6.92
  [3,16,0,0,-.02,1.45,0,-7.37,1.84,0,-6.92],
// 3 16 7.26 0 -4.75 6.14 0 -5.81 6.3639 0 -6.3639
  [3,16,7.26,0,-4.75,6.14,0,-5.81,6.3639,0,-6.3639],
// 3 16 8.3151 0 -3.4443 7.26 0 -4.75 6.3639 0 -6.3639
  [3,16,8.3151,0,-3.4443,7.26,0,-4.75,6.3639,0,-6.3639],
// 4 16 1.31 0 -7.91 1.45 0 -7.37 -1.45 0 -7.37 -1.31 0 -7.91
  [4,16,1.31,0,-7.91,1.45,0,-7.37,-1.45,0,-7.37,-1.31,0,-7.91],
// 4 16 1.45 0 -8.45 1.31 0 -7.91 -1.31 0 -7.91 -1.45 0 -8.45
  [4,16,1.45,0,-8.45,1.31,0,-7.91,-1.31,0,-7.91,-1.45,0,-8.45],
// 4 16 1.54 0 -8.56 1.45 0 -8.45 -1.45 0 -8.45 -1.54 0 -8.56
  [4,16,1.54,0,-8.56,1.45,0,-8.45,-1.45,0,-8.45,-1.54,0,-8.56],
// 3 16 1.54 0 -8.56 -1.54 0 -8.56 0 0 -9
  [3,16,1.54,0,-8.56,-1.54,0,-8.56,0,0,-9],
];
module ldraw_lib__98138p1l(step=0, col=false, unit=2/5, alt=false, line=0.2, solid=!$preview)
    makepoly(ldraw_lib__98138p1l(solid), step=step, col=col, unit=unit, alt=alt, line=line, solid=solid);
ldraw_lib__98138p1l(line=0.2);
